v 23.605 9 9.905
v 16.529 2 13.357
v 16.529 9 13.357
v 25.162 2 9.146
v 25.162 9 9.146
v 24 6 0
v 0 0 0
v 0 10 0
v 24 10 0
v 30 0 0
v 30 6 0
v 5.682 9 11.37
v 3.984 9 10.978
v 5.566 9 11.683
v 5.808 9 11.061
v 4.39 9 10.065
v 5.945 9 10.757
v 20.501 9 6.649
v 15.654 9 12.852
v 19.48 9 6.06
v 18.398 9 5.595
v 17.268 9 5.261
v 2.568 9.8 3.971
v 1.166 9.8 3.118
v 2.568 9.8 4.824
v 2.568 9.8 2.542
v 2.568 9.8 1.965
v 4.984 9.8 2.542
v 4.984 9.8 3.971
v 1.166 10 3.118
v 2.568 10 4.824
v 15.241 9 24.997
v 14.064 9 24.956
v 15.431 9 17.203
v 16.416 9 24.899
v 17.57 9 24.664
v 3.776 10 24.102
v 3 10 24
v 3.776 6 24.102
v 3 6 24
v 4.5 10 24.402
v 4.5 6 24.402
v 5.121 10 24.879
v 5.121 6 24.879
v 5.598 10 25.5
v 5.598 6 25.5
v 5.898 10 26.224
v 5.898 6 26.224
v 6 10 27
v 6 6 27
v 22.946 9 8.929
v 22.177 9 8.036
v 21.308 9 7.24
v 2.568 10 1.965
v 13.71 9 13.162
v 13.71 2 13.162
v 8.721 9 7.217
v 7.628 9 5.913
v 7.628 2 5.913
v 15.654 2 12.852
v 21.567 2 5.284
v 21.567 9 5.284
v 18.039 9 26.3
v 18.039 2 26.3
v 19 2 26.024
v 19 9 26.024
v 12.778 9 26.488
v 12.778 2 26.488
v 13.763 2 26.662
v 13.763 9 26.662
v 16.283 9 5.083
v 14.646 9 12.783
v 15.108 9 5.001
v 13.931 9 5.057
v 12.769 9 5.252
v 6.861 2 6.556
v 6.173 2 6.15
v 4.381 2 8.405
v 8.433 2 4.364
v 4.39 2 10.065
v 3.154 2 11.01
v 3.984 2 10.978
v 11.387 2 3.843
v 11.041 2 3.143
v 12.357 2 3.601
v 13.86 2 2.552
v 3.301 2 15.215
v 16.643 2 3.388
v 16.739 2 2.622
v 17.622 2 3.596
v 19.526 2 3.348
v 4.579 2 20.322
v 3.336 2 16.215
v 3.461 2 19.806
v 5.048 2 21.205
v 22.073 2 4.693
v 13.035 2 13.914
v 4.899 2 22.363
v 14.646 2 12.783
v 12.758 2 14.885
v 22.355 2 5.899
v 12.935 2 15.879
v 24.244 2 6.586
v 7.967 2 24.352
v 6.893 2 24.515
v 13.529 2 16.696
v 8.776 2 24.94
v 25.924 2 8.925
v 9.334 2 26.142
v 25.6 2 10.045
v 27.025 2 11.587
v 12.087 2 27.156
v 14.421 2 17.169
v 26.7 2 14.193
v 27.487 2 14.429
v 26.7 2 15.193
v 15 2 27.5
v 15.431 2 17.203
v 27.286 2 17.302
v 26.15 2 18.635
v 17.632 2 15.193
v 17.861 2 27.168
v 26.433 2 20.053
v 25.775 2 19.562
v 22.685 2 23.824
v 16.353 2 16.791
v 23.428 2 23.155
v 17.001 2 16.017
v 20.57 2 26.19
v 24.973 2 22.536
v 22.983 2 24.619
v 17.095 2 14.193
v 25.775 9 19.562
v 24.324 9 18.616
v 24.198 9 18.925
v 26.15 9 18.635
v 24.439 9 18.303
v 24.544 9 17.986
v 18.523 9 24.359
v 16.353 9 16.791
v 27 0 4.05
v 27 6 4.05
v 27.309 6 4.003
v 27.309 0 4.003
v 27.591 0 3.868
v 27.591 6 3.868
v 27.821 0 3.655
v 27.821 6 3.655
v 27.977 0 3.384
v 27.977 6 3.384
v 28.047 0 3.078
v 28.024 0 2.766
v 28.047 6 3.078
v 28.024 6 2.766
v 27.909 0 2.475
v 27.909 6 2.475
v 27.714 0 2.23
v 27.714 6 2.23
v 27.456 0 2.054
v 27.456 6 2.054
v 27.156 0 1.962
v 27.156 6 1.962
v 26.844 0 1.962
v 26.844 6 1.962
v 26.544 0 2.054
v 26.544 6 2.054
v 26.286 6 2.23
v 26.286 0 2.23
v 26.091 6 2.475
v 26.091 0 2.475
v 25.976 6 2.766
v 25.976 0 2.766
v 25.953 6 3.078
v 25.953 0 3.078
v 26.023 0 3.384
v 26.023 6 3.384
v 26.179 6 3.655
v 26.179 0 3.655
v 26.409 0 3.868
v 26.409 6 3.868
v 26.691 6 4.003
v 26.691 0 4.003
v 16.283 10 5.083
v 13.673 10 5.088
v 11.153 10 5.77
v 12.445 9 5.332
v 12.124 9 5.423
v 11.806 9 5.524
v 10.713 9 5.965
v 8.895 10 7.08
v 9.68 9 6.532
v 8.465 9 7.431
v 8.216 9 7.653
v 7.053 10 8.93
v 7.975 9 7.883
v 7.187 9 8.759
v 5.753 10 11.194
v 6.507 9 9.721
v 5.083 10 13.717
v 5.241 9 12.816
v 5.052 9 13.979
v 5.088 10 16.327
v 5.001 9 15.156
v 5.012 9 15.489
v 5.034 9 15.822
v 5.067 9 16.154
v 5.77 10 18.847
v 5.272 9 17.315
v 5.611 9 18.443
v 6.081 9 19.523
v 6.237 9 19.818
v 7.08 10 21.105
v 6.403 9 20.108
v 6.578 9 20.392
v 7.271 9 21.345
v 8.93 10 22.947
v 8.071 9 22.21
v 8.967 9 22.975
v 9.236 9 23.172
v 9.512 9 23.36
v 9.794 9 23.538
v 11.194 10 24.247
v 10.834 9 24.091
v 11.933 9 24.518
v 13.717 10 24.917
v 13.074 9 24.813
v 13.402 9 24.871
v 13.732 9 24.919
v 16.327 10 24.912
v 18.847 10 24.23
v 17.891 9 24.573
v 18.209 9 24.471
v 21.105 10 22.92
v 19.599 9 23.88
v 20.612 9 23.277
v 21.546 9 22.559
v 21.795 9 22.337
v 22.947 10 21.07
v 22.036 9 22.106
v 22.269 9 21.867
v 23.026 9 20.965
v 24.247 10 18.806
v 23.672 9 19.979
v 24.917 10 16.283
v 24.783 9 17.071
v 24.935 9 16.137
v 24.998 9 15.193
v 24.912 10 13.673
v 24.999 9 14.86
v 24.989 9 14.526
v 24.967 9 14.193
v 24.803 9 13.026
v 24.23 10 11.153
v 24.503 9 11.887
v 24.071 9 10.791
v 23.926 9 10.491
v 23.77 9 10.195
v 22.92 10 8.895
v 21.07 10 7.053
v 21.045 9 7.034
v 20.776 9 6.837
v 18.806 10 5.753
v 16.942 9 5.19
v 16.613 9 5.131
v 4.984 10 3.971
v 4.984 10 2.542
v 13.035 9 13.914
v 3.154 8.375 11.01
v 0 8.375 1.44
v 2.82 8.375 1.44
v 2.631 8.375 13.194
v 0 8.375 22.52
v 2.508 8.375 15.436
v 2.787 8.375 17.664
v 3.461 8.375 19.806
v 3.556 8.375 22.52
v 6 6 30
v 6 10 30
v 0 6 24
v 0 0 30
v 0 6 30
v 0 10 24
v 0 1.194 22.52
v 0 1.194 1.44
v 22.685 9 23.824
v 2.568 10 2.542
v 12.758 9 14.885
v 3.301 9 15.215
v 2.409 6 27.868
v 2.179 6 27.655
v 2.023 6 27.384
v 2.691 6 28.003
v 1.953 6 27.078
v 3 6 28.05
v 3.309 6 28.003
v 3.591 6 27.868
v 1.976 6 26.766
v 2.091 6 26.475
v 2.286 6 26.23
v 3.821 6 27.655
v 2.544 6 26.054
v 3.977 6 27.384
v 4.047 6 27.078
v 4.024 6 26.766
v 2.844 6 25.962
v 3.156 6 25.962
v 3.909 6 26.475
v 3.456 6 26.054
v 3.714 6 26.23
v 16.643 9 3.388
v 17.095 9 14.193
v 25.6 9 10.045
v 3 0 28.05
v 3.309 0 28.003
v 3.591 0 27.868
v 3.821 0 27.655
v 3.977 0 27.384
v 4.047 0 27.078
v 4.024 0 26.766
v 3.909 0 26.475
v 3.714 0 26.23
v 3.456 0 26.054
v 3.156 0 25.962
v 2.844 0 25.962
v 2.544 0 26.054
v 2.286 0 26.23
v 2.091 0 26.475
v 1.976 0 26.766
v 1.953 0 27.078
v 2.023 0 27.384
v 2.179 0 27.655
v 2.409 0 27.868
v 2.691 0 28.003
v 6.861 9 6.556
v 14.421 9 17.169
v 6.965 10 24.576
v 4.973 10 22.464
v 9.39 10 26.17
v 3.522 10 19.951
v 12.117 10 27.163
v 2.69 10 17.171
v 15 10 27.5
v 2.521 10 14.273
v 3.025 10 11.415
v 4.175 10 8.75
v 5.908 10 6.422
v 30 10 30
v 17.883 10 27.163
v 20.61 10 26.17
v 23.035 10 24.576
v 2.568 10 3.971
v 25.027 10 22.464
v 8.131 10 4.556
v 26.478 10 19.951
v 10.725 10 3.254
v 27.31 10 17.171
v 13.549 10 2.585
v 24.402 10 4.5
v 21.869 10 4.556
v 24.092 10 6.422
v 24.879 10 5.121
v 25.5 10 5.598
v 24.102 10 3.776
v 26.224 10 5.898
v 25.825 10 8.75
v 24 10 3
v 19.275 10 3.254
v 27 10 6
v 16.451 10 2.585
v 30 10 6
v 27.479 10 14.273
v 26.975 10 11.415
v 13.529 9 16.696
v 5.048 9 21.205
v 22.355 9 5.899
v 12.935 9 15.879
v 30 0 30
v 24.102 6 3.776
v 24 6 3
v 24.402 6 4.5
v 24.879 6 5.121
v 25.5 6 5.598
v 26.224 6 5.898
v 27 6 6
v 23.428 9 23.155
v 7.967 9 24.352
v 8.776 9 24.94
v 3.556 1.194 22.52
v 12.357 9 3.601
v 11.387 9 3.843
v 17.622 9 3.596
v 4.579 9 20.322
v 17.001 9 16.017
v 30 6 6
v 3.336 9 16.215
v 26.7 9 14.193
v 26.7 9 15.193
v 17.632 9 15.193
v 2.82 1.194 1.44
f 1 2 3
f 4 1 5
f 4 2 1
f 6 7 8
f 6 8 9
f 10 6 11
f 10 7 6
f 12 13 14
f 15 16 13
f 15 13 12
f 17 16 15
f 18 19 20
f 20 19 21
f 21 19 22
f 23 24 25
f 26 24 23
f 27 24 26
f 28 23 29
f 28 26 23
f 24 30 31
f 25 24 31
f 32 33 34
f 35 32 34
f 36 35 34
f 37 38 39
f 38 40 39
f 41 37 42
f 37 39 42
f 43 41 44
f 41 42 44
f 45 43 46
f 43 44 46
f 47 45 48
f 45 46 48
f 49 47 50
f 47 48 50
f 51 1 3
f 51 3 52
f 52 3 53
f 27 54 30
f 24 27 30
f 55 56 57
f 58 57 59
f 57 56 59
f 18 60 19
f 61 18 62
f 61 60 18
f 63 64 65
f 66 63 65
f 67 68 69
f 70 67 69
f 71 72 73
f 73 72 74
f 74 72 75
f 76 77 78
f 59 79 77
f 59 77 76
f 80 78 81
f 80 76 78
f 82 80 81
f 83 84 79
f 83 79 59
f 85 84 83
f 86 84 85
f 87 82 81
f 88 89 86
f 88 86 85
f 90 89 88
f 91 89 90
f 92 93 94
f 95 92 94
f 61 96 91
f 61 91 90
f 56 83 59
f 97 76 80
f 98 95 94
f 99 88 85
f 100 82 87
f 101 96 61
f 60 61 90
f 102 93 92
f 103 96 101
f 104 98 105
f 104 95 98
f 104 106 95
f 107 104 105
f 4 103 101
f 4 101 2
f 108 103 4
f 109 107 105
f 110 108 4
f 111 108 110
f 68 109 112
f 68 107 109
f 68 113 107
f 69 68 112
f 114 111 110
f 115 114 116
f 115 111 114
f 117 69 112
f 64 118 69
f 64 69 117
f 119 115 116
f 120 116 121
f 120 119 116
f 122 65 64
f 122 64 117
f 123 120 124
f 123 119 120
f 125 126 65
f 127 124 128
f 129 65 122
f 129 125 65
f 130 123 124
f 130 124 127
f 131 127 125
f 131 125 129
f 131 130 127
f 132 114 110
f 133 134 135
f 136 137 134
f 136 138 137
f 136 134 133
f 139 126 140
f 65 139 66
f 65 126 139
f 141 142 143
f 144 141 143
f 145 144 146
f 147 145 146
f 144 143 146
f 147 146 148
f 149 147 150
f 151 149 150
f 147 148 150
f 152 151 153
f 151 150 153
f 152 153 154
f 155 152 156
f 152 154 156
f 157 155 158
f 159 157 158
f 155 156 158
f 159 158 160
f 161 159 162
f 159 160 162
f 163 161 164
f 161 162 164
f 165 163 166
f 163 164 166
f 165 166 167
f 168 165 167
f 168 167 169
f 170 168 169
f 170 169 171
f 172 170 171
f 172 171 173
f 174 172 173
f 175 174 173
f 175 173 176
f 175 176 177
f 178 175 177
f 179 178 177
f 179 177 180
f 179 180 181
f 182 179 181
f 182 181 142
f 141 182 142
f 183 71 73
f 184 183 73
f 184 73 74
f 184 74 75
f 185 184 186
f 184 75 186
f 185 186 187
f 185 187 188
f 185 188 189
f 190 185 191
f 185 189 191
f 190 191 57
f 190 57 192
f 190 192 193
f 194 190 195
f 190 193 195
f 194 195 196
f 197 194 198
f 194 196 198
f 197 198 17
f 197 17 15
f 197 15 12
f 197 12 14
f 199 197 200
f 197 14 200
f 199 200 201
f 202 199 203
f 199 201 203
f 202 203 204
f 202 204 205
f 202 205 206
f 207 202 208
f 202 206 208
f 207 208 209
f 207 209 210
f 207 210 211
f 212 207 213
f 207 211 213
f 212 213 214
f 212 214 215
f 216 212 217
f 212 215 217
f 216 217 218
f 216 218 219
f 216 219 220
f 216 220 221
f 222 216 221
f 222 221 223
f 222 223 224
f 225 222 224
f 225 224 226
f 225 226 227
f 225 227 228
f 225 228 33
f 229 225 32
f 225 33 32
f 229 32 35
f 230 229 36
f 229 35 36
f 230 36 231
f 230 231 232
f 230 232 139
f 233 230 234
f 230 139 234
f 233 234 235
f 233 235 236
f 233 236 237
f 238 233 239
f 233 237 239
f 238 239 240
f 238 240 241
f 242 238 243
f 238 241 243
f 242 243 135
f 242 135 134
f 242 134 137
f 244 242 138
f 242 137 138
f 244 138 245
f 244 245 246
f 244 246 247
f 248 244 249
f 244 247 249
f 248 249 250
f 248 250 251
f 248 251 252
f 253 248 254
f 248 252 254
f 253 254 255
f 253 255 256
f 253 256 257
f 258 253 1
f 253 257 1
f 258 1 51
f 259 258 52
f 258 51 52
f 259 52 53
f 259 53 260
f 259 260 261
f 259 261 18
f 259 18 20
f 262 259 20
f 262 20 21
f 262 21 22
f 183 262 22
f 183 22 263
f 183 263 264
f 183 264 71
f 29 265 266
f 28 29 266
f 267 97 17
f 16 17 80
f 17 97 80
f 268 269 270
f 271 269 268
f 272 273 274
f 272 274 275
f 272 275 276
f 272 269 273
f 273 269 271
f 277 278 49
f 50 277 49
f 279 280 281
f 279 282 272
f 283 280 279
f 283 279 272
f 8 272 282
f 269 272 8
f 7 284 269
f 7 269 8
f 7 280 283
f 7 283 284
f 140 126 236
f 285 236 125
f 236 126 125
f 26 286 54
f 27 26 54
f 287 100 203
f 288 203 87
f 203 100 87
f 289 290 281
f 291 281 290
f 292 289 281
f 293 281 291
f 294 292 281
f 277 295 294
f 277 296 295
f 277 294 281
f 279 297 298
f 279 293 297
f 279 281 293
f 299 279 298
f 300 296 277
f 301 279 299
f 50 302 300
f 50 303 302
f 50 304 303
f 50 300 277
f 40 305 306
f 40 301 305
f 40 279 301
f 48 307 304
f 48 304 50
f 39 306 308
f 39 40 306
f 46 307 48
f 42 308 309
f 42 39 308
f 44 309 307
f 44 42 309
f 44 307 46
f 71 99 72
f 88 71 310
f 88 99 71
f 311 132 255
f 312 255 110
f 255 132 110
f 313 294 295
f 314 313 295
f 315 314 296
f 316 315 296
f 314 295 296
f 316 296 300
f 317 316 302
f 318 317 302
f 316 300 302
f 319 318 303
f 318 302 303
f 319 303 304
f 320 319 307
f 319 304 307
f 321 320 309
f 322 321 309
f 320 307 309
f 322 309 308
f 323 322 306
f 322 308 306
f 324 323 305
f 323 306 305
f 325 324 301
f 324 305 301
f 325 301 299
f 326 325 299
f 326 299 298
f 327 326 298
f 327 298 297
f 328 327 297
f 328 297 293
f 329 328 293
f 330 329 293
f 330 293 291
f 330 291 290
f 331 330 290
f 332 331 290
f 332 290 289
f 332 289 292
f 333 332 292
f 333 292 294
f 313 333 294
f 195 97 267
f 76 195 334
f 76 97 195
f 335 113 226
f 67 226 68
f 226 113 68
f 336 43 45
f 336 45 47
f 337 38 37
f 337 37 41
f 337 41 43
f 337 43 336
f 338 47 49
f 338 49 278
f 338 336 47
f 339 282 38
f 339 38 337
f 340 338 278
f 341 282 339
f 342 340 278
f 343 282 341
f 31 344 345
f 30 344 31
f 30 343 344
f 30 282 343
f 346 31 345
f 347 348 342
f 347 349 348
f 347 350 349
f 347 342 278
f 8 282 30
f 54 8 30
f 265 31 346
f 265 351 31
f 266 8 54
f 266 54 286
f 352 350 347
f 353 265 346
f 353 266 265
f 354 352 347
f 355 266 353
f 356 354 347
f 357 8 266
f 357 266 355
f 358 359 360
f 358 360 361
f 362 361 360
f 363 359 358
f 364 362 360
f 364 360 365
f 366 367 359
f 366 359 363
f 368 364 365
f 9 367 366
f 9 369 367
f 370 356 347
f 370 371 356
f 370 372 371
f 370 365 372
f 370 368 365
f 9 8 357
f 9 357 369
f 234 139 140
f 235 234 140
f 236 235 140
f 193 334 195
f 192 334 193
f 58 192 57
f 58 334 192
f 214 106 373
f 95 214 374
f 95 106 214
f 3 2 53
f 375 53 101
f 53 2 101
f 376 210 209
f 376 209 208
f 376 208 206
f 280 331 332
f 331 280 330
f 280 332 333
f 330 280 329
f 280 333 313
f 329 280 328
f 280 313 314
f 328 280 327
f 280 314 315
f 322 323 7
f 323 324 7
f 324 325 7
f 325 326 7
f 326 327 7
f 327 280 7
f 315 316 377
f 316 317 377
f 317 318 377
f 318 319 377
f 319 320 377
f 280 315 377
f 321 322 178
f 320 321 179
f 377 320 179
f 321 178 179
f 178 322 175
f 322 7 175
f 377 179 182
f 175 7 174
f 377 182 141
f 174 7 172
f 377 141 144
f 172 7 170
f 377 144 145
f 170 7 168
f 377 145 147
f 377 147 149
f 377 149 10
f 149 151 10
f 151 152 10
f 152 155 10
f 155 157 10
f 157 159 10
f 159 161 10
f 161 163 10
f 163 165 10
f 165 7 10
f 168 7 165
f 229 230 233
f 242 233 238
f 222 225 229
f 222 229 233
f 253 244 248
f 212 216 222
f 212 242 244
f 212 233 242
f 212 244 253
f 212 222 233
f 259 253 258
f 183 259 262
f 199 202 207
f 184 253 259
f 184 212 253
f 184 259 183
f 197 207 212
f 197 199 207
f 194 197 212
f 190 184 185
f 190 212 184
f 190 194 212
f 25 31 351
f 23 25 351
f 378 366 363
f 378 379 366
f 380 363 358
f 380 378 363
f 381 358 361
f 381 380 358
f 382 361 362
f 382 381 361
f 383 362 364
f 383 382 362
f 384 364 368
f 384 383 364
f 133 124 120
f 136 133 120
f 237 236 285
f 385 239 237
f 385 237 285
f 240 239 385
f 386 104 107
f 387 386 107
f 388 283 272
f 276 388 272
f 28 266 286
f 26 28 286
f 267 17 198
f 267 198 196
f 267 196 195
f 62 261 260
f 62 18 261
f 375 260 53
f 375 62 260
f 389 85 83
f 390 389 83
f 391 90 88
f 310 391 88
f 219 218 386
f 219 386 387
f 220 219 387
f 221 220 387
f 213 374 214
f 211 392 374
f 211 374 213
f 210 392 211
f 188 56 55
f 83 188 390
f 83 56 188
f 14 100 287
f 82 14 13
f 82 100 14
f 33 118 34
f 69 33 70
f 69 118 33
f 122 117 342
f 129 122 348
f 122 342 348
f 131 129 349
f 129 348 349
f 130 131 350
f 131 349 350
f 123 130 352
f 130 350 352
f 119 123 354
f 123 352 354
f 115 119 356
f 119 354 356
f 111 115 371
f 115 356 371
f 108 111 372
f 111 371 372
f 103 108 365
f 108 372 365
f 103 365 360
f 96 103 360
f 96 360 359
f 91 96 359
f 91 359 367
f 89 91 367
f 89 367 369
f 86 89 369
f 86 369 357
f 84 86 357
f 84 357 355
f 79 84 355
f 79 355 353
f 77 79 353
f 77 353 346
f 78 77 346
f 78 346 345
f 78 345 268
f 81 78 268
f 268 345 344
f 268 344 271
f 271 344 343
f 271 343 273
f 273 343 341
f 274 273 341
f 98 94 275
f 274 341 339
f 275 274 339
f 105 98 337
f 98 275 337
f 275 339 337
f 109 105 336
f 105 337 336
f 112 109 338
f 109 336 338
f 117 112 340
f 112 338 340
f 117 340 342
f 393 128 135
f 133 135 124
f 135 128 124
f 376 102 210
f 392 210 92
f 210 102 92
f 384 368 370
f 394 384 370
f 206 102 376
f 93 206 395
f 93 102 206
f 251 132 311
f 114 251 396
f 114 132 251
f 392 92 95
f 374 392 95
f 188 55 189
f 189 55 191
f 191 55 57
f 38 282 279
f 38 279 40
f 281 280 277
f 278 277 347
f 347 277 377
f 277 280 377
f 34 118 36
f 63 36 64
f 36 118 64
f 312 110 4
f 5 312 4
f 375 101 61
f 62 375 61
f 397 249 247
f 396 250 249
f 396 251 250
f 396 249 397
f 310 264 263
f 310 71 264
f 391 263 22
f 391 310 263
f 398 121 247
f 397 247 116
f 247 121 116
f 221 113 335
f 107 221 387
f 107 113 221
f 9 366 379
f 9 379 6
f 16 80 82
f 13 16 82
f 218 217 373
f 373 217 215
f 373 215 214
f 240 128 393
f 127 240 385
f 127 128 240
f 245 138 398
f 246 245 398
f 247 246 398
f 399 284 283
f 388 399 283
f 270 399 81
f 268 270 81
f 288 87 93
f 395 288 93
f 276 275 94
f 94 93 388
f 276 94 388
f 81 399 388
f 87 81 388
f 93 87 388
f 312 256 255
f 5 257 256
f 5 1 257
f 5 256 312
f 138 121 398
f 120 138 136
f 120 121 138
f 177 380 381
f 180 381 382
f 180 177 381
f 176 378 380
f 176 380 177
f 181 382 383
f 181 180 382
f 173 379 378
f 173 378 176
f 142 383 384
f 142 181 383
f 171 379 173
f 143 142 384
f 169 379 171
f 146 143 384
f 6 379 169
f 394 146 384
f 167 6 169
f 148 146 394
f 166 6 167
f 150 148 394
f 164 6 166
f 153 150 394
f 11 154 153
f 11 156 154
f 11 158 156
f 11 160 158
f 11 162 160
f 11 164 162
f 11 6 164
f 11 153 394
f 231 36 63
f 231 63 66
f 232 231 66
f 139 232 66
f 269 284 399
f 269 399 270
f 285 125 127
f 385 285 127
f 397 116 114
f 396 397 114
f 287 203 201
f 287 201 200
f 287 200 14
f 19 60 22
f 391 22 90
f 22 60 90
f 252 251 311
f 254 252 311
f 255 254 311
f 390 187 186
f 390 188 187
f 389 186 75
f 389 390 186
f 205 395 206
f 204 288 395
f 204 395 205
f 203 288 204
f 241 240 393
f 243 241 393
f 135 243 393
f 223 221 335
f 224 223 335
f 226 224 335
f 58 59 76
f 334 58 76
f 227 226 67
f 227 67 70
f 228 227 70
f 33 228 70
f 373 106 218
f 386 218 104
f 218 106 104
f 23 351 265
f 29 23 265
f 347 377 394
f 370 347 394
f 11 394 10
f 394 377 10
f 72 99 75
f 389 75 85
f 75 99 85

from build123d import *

# Parameters (mm, degrees)
SKETCH_1_W               = 30
SKETCH_1_H               = 30
EXTRUDE_1_DEPTH          = 10
SKETCH_2_W               = 6
SKETCH_2_H               = 6
CUT_EXTRUDE_1_DEPTH      = 4
SKETCH_3_R               = 12.5
CUT_EXTRUDE_2_DEPTH      = 8
FILLET_1_R               = 3
FILLET_2_R               = 3
CUT_EXTRUDE_3_DEPTH      = 0.2
SKETCH_5_R               = 1.05
CUT_EXTRUDE_4_DEPTH      = 10
SKETCH_6_W               = 11.699783002
SKETCH_6_H               = 1
EXTRUDE_2_DEPTH          = 7
PATTERN_CIRCULAR_1_COUNT = 14
PATTERN_CIRCULAR_1_ANGLE = 338
CUT_EXTRUDE_6_REACH      = 45.589
SKETCH_8_W               = 21.07962881
SKETCH_8_H               = 7.180633791
SKETCH_7_R               = 10
EXTRUDE_3_DEPTH          = 1


with BuildPart() as part:
    # 草图1 → 凸台-拉伸1 (new body)
    with BuildSketch(Plane(origin=(0, 0, 0), x_dir=(1, 0, 0), z_dir=(0, 1, 0))):
        with Locations((15, -15)):
            Rectangle(SKETCH_1_W, SKETCH_1_H)
    extrude(amount=EXTRUDE_1_DEPTH)

    # 草图2 → 切除-拉伸1 (cut)
    with BuildSketch(Plane(origin=(0, 10, 0), x_dir=(1, 0, 0), z_dir=(0, 1, 0))):
        with Locations((3, -27)):
            Rectangle(SKETCH_2_W, SKETCH_2_H)
        with Locations((27, -3)):
            Rectangle(SKETCH_2_W, SKETCH_2_H)
    extrude(amount=-CUT_EXTRUDE_1_DEPTH, mode=Mode.SUBTRACT)

    # 草图3 → 切除-拉伸2 (cut)
    with BuildSketch(Plane(origin=(0, 10, 0), x_dir=(1, 0, 0), z_dir=(0, 1, 0))):
        with Locations(Location((15, -15, 0), (0, 0, 270))):
            Circle(SKETCH_3_R)
    extrude(amount=-CUT_EXTRUDE_2_DEPTH, mode=Mode.SUBTRACT)

    # 圆角1
    fillet_1_edges = [part.edges().sort_by_distance(p)[0] for p in [
        (6, 8, 24),
    ]]
    fillet(fillet_1_edges, radius=FILLET_1_R)

    # 圆角2
    fillet_2_edges = [part.edges().sort_by_distance(p)[0] for p in [
        (24, 8, 6),
    ]]
    fillet(fillet_2_edges, radius=FILLET_2_R)

    # 草图4 → 切除-拉伸3 (cut)
    with BuildSketch(Plane(origin=(0, 10, 0), x_dir=(1, 0, 0), z_dir=(0, 1, 0))):
        Polygon((2.568201557, -1.964971172), (1.165606626, -3.118215893), (2.568201557, -4.824074593), (2.568201557, -3.971145243), (4.983781716, -3.971145243), (4.983781716, -2.541593533), (2.568201557, -2.541593533), align=None)
    extrude(amount=-CUT_EXTRUDE_3_DEPTH, mode=Mode.SUBTRACT)

    # 草图5 → 切除-拉伸4 (cut)
    with BuildSketch(Plane(origin=(0, 6, 0), x_dir=(1, 0, 0), z_dir=(0, 1, 0))):
        with Locations(Location((3, -27, 0), (0, 0, 270))):
            Circle(SKETCH_5_R)
        with Locations(Location((27, -3, 0), (0, 0, 270))):
            Circle(SKETCH_5_R)
    extrude(amount=-CUT_EXTRUDE_4_DEPTH, mode=Mode.SUBTRACT)

    # 草图6 → 凸台-拉伸2 (add)
    with BuildSketch(Plane(origin=(0, 2, 0), x_dir=(1, 0, 0), z_dir=(0, 1, 0))):
        with Locations((20.849891501, -14.693219625)):
            Rectangle(SKETCH_6_W, SKETCH_6_H)
    extrude_2 = extrude(amount=EXTRUDE_2_DEPTH)

    # 阵列(圆周)1: 凸台-拉伸2 ×14 about axis
    pattern_circular_1_axis = Axis((15, 0, 15), (0, 1, 0))
    for i in range(1, PATTERN_CIRCULAR_1_COUNT):
        add(extrude_2.rotate(pattern_circular_1_axis, i * PATTERN_CIRCULAR_1_ANGLE / (PATTERN_CIRCULAR_1_COUNT - 1)))

    # 切除-拉伸6: up to this plane
    cut_extrude_6_end = Plane(origin=(3.335500419, 9, 16.214605444), z_dir=(0.9993908270190957, 0, -0.034899496702506666))
    # 草图8 → 切除-拉伸6 (cut, up to the surface)
    with BuildSketch(Plane.ZY, mode=Mode.PRIVATE) as cut_extrude_6_sk1:
        with Locations((11.979819264, 4.784272805)):
            Rectangle(SKETCH_8_W, SKETCH_8_H)
    cut_extrude_6_tool1 = split(extrude(cut_extrude_6_sk1.sketch, amount=-CUT_EXTRUDE_6_REACH, mode=Mode.PRIVATE), bisect_by=cut_extrude_6_end, keep=Keep.BOTH, mode=Mode.PRIVATE)
    add(cut_extrude_6_tool1.solids().sort_by_distance((0, 4.784273, 11.979819))[0], mode=Mode.SUBTRACT)

    # 草图7 → 凸台-拉伸3 (add)
    with BuildSketch(Plane(origin=(0, 9, 0), x_dir=(1, 0, 0), z_dir=(0, 1, 0))):
        with Locations(Location((15, -15, 0), (0, 0, 82.627540404))):
            Circle(SKETCH_7_R)
    extrude(amount=EXTRUDE_3_DEPTH)


solid = part.part
